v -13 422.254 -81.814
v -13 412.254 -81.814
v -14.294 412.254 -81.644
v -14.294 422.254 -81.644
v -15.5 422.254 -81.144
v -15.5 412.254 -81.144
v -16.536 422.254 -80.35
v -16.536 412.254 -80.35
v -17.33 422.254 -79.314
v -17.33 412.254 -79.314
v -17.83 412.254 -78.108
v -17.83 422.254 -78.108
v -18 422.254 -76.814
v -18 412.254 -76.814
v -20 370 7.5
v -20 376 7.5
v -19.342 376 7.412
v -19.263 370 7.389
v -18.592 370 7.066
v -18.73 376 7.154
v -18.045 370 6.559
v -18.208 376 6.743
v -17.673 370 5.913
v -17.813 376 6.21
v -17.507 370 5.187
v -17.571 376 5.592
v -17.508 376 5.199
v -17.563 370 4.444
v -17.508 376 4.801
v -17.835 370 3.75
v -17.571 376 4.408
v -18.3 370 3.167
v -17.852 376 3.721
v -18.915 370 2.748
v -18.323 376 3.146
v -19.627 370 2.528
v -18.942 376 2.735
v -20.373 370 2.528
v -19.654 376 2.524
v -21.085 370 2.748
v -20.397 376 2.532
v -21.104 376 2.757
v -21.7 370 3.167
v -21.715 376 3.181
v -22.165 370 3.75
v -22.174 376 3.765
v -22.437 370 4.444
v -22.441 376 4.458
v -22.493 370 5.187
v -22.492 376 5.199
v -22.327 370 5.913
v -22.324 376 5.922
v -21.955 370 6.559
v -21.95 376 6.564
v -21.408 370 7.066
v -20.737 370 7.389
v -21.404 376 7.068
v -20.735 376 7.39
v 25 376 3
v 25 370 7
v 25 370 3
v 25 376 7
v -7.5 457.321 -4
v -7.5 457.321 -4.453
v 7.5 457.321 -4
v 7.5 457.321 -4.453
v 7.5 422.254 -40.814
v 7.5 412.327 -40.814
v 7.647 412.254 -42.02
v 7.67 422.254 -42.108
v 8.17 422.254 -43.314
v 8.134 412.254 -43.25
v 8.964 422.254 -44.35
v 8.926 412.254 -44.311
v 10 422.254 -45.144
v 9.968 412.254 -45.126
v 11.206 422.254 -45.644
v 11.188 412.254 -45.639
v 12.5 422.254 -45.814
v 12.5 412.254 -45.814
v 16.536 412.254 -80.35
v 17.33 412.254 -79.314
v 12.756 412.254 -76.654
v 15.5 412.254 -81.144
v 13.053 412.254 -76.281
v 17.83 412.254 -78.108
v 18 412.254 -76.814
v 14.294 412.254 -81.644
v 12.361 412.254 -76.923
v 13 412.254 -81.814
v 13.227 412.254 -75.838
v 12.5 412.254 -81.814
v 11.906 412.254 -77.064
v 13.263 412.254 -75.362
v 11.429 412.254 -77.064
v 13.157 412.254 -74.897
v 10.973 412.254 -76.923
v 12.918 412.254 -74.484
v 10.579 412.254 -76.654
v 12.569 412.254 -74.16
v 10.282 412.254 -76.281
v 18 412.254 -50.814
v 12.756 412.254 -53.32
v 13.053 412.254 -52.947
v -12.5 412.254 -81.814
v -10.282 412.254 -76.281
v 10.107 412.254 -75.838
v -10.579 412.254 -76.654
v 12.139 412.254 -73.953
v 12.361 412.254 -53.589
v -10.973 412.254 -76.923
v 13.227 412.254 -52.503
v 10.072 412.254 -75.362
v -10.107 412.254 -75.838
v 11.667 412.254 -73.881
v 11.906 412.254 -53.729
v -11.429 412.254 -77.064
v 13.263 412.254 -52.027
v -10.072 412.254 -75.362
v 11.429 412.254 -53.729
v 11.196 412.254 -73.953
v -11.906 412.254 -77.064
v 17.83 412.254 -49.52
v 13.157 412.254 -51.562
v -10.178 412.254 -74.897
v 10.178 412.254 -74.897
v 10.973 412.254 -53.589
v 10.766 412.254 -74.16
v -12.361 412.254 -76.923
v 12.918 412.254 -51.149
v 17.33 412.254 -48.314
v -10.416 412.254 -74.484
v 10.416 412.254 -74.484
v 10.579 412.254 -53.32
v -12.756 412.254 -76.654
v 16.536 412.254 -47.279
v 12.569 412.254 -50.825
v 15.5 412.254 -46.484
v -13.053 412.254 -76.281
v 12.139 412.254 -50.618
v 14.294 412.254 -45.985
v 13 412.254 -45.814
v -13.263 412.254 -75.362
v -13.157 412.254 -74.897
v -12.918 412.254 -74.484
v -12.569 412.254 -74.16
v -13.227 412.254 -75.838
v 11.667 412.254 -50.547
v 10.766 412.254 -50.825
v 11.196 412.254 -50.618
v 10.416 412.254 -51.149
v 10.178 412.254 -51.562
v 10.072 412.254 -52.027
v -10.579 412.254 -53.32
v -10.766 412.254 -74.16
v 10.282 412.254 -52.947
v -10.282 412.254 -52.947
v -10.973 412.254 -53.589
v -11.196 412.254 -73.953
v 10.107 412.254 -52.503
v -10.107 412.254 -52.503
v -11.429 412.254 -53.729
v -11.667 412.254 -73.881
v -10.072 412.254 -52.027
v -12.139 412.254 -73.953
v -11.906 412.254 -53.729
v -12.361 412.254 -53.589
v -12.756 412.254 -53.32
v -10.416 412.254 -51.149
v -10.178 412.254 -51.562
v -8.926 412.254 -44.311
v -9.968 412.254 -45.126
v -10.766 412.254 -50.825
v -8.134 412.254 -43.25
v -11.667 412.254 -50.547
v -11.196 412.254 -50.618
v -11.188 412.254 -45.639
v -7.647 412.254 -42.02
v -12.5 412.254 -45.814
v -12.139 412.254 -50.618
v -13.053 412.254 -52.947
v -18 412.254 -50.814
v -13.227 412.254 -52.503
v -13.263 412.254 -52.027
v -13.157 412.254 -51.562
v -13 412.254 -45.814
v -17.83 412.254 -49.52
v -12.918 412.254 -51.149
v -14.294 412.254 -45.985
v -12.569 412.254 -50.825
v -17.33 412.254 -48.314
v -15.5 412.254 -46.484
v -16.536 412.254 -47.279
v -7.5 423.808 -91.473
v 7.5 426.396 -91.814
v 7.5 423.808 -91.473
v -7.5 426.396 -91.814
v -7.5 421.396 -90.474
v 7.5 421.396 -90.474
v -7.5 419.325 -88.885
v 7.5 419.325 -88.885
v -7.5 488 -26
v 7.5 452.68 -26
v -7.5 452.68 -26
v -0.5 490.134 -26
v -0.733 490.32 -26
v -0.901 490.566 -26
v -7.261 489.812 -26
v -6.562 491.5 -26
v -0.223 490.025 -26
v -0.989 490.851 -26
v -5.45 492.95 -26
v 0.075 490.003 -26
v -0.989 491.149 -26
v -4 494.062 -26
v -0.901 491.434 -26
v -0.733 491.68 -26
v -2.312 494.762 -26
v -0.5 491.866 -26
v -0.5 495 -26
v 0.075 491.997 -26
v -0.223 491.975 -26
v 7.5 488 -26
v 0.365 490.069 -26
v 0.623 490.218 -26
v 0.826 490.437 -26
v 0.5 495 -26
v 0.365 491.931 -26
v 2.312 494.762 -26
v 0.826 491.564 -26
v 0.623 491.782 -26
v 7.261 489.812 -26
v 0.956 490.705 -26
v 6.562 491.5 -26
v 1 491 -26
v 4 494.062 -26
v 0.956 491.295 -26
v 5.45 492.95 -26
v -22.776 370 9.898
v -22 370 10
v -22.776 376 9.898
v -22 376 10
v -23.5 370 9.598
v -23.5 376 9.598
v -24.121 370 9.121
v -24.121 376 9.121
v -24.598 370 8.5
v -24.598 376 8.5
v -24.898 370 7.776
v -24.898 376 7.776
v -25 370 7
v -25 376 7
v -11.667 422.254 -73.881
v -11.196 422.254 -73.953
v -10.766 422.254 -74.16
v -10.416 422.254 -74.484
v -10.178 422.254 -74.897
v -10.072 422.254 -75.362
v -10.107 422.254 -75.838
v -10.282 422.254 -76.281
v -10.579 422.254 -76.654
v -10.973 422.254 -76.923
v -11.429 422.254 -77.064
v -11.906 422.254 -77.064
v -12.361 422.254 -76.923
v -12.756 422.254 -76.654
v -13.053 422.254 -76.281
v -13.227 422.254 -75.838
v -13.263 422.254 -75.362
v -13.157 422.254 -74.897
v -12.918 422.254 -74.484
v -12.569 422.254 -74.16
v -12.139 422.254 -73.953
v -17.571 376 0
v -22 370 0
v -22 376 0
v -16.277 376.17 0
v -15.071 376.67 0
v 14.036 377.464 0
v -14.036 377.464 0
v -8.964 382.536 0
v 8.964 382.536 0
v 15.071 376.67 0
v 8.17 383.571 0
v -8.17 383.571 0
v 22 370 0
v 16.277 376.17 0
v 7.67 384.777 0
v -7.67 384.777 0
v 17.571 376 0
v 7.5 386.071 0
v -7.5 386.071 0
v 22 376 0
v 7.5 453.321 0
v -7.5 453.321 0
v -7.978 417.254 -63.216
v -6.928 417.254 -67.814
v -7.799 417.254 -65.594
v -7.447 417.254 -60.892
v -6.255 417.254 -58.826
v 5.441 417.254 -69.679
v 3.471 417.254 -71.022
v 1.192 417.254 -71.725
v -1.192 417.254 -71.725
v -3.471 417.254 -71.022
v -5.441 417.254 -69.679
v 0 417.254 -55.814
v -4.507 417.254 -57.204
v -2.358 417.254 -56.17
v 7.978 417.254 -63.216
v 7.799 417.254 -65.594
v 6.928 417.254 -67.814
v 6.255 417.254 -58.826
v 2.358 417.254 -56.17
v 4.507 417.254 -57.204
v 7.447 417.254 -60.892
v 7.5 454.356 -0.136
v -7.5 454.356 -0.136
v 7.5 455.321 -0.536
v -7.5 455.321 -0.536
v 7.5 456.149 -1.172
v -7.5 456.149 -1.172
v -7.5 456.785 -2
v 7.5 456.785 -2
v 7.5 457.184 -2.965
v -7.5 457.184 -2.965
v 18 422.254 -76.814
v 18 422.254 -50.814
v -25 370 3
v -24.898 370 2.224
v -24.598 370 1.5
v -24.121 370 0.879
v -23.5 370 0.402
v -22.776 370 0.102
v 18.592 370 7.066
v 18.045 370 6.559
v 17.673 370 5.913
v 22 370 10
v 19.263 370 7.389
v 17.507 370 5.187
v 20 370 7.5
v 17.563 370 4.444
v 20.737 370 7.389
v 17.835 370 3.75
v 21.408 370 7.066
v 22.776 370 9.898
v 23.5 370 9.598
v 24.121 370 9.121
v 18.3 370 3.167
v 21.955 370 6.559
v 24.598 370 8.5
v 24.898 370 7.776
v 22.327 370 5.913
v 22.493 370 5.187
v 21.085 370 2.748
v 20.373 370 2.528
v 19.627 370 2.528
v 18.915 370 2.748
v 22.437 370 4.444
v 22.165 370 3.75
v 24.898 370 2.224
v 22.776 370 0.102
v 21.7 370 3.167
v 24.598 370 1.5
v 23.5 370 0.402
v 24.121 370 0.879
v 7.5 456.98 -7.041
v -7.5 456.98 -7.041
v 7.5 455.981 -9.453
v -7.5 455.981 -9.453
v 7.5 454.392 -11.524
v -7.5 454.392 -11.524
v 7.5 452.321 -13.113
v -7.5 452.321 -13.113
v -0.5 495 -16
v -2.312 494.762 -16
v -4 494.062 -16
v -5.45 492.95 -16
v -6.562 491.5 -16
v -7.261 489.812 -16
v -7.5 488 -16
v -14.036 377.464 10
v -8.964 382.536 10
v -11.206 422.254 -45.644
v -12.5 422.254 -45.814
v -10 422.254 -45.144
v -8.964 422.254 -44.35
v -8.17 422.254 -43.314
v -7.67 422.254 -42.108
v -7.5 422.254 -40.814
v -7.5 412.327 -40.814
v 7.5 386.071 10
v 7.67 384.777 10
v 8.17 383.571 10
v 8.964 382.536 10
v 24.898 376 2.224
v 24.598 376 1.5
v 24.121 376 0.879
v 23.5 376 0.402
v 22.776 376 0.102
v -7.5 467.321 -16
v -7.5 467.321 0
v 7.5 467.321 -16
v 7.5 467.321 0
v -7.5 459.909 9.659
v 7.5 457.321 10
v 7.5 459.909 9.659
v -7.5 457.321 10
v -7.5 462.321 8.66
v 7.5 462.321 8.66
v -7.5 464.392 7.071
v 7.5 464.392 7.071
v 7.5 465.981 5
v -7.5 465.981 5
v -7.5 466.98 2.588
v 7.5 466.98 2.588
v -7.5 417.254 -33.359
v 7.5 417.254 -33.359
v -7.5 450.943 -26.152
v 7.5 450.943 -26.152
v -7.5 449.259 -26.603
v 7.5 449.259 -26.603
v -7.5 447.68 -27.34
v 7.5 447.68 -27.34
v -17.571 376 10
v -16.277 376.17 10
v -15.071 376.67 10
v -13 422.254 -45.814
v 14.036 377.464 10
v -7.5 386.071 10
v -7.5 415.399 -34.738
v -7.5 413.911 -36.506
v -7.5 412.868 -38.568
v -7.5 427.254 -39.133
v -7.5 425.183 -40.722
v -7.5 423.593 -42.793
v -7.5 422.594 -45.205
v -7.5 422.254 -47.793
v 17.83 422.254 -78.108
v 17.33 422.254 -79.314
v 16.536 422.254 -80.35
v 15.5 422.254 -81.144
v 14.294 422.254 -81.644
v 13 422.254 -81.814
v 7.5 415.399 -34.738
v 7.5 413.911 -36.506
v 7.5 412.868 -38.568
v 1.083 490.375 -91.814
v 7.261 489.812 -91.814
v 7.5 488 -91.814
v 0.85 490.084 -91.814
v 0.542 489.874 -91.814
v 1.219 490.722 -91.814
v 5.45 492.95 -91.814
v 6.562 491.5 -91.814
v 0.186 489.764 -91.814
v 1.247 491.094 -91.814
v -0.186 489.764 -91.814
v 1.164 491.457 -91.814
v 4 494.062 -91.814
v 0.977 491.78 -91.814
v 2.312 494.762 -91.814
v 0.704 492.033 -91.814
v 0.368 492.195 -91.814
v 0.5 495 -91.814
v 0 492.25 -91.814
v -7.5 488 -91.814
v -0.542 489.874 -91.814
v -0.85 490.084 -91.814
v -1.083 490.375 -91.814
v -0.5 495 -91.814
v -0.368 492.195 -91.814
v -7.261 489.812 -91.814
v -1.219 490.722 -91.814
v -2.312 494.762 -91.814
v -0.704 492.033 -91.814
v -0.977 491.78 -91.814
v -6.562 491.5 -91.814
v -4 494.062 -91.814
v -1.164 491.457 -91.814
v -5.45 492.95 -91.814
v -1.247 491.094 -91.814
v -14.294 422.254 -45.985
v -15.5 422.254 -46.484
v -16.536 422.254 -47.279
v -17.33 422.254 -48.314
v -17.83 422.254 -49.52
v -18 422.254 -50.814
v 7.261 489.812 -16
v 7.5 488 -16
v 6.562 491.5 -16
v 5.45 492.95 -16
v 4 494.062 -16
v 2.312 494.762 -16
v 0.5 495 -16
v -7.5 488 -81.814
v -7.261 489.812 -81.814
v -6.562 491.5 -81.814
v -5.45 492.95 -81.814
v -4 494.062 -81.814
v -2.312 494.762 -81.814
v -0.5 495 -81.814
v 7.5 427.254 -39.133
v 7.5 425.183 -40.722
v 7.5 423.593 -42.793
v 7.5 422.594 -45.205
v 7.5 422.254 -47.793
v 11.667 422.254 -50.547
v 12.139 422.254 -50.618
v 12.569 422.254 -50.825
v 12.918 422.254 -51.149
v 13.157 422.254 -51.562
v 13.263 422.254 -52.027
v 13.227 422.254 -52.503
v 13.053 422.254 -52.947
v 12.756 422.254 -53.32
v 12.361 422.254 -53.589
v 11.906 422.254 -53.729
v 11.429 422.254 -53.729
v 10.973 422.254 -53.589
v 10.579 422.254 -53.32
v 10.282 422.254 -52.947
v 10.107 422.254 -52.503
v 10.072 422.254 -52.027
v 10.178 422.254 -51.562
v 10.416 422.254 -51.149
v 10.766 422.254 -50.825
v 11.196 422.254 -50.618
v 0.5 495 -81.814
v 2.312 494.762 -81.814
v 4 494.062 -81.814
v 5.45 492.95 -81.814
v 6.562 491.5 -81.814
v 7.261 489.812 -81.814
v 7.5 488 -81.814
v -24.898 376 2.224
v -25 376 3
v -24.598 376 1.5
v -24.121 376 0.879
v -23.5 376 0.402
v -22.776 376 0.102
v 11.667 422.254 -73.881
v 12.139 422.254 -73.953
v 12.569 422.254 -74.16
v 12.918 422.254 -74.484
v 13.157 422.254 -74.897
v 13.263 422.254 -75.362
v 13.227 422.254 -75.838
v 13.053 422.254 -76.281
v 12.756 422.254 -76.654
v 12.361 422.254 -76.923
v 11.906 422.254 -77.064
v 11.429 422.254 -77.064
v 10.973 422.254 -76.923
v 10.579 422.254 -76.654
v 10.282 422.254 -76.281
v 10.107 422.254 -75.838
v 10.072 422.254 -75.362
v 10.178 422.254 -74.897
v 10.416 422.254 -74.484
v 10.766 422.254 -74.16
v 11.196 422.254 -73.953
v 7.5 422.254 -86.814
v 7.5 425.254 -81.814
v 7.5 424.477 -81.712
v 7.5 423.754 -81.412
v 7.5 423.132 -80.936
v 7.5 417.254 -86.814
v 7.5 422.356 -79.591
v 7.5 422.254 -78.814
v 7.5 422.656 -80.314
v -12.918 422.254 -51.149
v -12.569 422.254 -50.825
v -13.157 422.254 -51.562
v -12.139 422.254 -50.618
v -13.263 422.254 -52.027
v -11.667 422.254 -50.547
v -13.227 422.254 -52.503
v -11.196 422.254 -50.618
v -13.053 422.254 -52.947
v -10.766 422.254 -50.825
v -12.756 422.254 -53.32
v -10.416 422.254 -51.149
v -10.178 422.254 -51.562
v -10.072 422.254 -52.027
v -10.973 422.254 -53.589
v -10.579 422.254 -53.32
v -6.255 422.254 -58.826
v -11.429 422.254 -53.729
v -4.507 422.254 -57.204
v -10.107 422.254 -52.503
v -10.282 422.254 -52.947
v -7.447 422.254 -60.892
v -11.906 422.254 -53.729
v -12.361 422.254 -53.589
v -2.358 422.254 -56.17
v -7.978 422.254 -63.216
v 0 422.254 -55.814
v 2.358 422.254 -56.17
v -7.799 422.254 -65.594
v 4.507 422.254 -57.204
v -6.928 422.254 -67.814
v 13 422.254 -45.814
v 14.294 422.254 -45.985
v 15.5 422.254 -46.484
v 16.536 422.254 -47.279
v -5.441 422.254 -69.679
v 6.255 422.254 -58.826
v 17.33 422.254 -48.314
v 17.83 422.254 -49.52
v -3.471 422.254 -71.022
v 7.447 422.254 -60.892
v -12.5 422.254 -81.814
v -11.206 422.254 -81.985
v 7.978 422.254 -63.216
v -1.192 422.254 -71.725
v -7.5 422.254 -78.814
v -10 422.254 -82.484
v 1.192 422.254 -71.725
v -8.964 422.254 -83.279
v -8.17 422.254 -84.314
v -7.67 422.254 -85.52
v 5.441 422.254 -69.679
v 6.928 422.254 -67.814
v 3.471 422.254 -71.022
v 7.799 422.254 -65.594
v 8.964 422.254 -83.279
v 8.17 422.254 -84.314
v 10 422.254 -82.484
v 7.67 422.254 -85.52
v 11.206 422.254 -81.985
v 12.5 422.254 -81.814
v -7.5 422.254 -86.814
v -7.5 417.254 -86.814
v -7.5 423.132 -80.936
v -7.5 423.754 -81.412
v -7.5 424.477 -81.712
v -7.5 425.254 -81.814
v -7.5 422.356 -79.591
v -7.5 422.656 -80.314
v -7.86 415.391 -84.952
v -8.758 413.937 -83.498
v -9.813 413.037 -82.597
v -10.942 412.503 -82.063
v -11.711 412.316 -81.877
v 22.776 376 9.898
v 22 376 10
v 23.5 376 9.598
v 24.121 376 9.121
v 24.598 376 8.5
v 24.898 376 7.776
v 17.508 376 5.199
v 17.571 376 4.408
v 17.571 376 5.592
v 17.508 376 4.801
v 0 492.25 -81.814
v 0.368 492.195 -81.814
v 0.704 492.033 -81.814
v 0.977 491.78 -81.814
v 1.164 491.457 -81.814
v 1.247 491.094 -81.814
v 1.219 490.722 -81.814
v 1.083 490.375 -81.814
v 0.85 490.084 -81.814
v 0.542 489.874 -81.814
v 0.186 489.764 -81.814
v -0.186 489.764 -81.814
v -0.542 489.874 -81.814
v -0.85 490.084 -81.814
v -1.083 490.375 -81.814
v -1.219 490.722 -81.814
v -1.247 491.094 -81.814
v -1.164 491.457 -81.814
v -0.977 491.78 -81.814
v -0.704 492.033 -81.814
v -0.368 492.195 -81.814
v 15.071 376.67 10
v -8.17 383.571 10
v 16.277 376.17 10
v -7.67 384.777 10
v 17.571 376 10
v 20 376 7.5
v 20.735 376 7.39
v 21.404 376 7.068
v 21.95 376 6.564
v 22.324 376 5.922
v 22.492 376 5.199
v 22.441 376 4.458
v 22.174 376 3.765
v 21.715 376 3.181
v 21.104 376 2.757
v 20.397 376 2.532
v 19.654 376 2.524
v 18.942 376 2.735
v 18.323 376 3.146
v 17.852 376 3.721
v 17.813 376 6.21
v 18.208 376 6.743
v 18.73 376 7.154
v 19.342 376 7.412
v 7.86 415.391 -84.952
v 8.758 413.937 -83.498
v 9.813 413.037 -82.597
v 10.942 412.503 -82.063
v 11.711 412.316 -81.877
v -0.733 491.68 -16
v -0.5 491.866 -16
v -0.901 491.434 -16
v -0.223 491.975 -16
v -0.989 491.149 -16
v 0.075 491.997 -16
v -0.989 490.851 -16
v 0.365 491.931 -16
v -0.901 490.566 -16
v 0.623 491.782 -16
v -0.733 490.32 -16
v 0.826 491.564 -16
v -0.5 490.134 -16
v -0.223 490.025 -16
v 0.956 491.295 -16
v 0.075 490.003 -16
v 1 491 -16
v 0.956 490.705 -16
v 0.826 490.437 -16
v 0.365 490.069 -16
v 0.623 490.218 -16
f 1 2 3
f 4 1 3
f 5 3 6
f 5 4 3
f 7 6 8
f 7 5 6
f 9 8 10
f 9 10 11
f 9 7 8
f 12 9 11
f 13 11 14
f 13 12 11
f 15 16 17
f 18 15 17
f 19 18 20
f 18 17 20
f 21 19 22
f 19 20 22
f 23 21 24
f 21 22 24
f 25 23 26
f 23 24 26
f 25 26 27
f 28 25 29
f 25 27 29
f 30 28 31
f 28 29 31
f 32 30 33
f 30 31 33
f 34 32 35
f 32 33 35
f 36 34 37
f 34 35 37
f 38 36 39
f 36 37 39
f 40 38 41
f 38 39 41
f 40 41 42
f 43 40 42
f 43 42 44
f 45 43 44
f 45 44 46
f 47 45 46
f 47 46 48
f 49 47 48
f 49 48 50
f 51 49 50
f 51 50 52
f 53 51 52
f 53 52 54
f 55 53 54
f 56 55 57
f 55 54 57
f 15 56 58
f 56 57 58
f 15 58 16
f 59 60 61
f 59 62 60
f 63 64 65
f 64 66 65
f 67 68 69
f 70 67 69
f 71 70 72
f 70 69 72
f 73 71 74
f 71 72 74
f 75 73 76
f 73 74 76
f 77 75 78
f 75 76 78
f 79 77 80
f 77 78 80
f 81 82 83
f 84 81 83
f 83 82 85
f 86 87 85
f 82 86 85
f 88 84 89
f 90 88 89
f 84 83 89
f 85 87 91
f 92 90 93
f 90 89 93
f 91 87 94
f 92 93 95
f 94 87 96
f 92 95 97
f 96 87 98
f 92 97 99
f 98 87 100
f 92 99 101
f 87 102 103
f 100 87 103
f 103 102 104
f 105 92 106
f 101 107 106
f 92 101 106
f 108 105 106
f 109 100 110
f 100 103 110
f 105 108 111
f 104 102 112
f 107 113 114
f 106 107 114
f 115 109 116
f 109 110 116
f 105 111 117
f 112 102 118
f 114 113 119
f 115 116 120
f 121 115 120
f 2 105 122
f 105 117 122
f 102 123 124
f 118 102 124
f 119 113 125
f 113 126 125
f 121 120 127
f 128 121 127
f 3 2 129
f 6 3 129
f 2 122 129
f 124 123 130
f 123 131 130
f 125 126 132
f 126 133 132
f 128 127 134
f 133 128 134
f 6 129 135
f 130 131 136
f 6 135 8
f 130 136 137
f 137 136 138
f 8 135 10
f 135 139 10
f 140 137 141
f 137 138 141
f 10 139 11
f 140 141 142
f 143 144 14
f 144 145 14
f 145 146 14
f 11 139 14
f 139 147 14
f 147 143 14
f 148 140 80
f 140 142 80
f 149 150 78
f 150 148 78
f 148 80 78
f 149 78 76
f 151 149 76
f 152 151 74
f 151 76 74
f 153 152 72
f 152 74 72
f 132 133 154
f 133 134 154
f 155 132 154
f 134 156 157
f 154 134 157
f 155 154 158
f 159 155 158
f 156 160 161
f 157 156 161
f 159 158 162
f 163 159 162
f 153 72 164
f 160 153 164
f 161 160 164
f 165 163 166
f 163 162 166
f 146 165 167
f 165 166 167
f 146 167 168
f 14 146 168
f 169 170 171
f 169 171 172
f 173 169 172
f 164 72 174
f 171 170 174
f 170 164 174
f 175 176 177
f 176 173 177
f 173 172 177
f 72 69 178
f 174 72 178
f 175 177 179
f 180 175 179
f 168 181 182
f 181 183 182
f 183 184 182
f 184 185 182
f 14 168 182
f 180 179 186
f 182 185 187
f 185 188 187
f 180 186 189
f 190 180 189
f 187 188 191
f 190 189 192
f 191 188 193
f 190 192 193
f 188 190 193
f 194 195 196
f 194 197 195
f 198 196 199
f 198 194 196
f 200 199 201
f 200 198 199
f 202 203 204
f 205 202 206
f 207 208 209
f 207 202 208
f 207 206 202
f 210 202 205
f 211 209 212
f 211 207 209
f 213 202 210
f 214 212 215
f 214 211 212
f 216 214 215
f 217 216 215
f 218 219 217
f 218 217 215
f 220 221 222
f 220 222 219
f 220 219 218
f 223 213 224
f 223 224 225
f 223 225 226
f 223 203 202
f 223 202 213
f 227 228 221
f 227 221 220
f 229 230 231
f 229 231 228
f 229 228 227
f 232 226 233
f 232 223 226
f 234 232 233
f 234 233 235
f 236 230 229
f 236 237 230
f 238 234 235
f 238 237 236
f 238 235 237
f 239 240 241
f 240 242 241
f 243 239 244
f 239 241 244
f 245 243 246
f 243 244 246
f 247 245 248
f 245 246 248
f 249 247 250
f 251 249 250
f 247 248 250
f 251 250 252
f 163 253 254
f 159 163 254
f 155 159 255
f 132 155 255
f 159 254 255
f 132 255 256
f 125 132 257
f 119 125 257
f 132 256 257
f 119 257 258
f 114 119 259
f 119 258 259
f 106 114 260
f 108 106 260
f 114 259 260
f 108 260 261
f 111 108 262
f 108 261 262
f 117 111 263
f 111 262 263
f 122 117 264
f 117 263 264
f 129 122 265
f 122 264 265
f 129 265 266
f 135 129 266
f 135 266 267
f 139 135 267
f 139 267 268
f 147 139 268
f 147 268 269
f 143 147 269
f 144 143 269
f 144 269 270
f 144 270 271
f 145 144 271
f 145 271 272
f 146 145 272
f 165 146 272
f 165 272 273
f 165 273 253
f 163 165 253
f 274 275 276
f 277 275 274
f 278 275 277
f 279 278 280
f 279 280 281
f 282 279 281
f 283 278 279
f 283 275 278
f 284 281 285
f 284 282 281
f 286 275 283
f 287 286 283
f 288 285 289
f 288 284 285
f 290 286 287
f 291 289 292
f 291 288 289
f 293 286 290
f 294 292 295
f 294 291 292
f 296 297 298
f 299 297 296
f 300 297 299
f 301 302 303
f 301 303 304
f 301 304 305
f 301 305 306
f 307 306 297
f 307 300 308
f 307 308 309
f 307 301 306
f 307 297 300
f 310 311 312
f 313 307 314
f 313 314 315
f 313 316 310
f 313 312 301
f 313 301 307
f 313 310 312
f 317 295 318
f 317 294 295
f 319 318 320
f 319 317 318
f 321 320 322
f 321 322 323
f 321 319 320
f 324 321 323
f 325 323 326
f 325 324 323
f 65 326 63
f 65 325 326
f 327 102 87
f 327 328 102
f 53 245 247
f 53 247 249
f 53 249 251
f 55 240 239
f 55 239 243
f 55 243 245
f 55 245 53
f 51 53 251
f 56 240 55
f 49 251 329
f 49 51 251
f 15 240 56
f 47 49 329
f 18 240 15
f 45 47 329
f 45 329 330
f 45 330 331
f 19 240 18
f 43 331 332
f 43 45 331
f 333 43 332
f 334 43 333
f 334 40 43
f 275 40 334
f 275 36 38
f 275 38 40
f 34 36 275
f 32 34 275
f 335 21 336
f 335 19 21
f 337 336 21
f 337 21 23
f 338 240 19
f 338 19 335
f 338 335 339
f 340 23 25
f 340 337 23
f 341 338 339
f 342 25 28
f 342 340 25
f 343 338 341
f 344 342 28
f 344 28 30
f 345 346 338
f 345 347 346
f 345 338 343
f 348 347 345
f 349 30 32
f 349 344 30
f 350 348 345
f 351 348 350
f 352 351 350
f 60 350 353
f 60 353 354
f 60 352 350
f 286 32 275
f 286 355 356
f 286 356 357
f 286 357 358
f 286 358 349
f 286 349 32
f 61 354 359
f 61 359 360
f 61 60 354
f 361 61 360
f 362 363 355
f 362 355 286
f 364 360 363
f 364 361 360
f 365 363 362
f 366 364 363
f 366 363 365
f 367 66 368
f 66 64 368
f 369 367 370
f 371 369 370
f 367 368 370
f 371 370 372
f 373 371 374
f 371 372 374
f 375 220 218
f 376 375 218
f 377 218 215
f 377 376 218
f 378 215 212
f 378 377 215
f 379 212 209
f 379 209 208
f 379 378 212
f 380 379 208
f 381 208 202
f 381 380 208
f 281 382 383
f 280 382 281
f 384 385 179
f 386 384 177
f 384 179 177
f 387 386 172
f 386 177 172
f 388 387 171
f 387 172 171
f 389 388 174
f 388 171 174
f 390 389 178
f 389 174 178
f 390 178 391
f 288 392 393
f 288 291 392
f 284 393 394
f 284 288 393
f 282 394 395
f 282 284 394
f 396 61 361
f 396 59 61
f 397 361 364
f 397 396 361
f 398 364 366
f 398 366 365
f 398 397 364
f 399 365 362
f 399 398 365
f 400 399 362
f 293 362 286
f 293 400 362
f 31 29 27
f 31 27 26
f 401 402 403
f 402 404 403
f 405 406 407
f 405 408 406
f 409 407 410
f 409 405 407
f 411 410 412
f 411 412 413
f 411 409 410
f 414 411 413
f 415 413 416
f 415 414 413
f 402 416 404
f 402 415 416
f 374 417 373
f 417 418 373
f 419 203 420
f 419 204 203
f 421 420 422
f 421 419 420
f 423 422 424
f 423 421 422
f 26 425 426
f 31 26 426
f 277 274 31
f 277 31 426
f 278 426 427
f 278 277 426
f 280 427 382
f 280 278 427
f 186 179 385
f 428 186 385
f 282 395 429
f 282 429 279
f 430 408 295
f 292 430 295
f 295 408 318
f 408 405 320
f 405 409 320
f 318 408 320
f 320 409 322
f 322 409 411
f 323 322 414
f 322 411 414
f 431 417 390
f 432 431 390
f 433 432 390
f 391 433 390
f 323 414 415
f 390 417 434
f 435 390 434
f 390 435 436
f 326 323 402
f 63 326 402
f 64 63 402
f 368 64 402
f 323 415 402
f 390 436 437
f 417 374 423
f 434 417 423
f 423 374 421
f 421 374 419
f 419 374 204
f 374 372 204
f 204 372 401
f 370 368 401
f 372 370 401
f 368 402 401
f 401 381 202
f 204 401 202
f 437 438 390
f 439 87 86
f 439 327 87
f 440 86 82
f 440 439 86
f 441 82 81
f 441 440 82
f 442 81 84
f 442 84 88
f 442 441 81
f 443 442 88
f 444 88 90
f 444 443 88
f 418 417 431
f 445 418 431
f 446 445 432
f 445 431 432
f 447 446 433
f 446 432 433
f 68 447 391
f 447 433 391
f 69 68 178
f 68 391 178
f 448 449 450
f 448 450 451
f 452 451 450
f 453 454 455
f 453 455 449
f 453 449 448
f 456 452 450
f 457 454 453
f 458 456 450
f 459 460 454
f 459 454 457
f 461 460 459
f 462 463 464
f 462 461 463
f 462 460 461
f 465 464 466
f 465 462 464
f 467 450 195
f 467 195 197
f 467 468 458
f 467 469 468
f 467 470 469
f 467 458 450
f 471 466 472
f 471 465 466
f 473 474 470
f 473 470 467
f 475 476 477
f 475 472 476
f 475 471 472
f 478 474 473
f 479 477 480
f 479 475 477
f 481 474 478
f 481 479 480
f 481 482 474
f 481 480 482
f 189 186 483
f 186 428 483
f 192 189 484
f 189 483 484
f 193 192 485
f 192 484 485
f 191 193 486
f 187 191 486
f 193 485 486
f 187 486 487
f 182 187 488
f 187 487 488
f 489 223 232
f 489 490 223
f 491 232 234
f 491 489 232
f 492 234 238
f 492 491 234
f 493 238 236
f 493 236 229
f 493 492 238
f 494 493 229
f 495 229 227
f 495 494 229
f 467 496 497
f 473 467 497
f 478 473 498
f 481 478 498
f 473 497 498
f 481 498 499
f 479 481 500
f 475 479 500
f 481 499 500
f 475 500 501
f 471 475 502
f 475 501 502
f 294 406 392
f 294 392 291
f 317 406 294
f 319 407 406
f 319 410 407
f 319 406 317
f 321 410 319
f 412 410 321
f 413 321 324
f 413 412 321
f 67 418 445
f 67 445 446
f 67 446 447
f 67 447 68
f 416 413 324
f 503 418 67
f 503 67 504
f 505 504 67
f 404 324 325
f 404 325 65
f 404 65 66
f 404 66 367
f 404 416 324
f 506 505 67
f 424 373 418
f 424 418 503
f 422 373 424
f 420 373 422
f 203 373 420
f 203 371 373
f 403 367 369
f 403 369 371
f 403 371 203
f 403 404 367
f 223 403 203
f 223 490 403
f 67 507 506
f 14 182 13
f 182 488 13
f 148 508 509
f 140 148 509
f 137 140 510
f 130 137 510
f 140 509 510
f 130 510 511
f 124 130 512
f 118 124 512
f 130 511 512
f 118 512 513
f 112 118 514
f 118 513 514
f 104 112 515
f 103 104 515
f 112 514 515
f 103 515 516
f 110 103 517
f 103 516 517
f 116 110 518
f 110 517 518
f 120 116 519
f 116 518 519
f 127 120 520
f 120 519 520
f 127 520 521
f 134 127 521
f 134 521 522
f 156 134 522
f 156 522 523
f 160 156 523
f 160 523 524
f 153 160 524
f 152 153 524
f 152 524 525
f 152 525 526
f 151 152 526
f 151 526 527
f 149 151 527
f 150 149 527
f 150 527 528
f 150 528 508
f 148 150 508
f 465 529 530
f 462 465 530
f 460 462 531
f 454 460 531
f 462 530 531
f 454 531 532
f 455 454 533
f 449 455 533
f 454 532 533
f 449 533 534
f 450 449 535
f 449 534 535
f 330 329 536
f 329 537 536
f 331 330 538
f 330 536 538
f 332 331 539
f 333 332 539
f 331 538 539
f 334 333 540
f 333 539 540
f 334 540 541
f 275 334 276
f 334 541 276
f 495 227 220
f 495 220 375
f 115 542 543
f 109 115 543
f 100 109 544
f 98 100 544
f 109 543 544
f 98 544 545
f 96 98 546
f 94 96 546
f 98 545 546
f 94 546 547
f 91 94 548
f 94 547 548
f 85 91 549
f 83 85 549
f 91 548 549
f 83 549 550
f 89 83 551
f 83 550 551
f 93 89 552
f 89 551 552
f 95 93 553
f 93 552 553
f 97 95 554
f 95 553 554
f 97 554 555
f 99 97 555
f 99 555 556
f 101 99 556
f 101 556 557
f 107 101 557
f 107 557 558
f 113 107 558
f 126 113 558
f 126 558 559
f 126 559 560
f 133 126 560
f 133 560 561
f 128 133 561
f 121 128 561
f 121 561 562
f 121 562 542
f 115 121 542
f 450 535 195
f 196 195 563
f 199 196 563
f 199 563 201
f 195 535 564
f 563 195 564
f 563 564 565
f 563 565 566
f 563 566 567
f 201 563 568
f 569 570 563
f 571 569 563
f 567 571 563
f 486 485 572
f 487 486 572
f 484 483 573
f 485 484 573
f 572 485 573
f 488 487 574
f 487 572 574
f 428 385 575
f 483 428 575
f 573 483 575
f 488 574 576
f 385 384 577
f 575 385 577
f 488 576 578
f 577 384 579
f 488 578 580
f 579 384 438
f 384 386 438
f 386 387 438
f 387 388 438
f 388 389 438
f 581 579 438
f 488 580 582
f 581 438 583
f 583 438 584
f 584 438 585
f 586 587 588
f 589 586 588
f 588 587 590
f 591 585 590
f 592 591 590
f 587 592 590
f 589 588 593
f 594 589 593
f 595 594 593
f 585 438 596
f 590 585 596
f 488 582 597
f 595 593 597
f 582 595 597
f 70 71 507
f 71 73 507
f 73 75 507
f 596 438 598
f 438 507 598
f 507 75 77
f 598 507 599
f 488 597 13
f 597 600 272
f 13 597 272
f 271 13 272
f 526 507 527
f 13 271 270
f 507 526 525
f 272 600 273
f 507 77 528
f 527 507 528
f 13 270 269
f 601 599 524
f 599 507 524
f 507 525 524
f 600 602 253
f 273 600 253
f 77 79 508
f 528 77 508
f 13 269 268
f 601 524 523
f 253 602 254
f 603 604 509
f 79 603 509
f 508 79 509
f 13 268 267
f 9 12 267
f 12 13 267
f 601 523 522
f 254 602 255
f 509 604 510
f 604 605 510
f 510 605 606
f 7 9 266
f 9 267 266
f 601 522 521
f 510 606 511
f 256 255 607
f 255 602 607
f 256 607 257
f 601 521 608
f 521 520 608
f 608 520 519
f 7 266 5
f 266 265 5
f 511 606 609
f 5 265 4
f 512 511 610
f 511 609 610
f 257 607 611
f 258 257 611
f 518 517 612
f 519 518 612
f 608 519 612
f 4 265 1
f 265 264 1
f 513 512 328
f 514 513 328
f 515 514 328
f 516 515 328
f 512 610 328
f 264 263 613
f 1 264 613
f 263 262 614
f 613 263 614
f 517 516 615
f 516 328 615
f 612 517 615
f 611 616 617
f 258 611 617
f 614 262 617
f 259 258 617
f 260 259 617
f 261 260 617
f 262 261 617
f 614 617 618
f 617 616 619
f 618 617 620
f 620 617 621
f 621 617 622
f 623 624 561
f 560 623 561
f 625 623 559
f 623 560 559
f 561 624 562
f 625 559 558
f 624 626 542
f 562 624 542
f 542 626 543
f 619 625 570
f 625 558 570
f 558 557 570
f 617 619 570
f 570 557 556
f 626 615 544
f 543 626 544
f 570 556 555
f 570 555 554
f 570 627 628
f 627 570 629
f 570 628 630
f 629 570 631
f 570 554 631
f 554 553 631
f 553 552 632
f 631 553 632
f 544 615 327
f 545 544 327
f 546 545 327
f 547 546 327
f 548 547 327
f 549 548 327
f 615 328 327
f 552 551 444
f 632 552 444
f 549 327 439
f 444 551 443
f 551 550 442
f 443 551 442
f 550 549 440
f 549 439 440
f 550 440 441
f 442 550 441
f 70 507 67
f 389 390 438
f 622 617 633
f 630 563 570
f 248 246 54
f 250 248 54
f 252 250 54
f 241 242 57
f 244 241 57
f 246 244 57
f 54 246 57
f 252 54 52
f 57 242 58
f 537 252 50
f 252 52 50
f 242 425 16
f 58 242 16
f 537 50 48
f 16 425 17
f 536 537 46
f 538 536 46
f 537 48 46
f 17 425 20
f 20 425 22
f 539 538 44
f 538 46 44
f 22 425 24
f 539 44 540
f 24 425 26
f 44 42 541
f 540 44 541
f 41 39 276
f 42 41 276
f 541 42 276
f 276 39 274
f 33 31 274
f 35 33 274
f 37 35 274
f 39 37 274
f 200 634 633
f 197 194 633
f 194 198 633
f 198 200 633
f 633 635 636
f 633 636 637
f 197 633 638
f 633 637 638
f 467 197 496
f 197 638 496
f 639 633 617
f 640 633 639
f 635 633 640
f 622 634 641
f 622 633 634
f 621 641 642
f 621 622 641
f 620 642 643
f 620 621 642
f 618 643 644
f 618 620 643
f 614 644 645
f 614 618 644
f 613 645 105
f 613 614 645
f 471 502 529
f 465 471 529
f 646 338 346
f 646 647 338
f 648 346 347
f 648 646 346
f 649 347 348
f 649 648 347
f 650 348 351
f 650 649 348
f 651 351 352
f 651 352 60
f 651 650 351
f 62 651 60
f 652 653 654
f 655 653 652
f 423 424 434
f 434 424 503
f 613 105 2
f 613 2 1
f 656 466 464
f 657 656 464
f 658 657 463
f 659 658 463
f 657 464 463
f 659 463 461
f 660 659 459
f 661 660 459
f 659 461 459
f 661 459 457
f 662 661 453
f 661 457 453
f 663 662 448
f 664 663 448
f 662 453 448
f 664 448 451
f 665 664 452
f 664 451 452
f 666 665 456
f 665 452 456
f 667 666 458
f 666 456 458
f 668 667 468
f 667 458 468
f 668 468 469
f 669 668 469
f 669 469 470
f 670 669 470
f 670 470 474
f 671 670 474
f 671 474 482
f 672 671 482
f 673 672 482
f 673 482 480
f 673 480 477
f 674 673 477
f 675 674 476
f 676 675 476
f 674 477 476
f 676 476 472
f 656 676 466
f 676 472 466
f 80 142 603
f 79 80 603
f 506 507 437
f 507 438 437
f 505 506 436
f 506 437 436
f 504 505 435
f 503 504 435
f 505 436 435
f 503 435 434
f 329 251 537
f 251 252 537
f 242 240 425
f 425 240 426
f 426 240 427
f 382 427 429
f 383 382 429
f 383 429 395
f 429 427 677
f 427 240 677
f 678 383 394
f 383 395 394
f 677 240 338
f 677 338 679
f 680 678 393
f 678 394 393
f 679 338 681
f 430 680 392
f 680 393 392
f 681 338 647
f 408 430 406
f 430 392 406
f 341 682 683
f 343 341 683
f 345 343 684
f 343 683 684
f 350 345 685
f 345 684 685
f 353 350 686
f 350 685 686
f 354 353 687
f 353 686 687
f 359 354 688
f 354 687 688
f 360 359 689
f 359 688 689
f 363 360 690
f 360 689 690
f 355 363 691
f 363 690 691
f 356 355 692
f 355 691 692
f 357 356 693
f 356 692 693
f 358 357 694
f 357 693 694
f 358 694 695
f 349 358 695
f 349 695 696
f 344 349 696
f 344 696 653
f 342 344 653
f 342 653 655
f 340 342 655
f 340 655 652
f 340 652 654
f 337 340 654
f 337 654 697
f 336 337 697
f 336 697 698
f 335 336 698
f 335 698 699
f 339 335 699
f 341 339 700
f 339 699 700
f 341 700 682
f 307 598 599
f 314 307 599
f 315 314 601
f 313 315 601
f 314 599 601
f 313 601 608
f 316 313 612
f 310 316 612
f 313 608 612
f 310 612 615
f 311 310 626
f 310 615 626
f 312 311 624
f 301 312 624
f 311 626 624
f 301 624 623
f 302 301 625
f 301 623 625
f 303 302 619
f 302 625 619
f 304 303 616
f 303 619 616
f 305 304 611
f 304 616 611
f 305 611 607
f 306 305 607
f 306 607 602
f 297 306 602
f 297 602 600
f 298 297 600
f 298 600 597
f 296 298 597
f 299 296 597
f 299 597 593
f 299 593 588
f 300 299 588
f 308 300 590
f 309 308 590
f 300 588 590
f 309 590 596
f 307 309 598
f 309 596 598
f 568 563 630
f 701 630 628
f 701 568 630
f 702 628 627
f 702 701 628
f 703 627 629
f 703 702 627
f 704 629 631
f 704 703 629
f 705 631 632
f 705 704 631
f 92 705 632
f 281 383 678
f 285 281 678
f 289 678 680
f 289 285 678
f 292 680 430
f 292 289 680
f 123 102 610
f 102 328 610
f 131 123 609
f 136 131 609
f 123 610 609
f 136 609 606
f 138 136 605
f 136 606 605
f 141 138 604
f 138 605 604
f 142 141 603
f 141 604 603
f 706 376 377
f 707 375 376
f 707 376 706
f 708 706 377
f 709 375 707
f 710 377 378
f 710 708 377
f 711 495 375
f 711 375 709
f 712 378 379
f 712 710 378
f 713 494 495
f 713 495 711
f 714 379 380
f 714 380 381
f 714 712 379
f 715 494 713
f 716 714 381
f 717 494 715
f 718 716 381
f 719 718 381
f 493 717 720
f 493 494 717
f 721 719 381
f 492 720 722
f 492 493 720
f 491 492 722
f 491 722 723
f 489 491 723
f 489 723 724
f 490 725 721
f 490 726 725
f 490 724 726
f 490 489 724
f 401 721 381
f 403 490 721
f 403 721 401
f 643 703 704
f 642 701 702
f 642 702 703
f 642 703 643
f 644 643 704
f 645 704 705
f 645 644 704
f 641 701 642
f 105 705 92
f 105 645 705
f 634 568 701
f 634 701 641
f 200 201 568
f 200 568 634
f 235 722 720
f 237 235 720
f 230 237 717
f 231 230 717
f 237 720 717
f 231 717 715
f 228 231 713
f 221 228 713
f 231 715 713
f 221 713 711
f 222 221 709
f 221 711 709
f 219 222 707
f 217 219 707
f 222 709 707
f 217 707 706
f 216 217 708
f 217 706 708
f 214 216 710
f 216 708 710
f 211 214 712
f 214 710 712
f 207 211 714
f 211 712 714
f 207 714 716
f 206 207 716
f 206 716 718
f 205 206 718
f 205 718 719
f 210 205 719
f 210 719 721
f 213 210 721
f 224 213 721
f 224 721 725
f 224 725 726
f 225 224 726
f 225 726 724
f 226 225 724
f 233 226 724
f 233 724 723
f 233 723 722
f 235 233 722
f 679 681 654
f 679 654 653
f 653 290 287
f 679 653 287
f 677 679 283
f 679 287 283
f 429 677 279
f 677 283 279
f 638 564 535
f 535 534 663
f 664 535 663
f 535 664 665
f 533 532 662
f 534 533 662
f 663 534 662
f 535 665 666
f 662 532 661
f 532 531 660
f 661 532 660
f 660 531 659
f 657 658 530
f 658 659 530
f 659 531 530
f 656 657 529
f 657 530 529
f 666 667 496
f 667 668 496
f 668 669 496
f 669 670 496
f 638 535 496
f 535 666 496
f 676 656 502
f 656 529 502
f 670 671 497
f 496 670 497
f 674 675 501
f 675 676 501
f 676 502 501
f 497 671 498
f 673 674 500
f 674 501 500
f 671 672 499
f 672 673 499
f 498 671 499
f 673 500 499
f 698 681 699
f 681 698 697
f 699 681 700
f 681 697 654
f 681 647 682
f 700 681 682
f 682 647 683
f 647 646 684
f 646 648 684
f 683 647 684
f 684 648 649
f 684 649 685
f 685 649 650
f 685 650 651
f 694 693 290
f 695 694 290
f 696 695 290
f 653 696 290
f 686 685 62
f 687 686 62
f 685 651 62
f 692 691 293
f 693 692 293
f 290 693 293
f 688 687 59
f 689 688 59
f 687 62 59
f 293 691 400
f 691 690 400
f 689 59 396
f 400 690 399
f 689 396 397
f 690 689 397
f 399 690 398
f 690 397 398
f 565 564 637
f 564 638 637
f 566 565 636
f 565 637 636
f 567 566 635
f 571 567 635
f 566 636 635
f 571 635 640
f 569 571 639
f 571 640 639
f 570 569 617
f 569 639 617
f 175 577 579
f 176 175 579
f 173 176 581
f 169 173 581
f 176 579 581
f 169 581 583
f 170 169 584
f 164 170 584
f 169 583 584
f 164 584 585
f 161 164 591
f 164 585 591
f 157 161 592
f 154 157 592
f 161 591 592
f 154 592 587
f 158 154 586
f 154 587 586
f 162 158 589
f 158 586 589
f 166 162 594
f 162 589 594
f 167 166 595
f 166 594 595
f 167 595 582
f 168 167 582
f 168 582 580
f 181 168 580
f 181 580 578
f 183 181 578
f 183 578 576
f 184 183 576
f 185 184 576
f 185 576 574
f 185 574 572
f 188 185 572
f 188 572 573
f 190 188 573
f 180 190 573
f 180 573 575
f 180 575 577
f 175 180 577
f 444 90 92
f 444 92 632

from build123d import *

# Parameters (mm, degrees)
SKETCH1_W           = 40
SKETCH1_H           = 50
BOSS_EXTRUDE1_DEPTH = 5
BOSS_EXTRUDE2_DEPTH = 7.5
FILLET3_R           = 10
SKETCH6_W           = 36
SKETCH6_H           = 10
BOSS_EXTRUDE3_DEPTH = 18
SKETCH7_R           = 8
CUT_EXTRUDE3_DEPTH  = 5
FILLET5_R           = 5
SKETCH8_R           = 1.6
CUT_EXTRUDE4_DEPTH  = 100.116132934
FILLET6_R           = 3
BOSS_EXTRUDE4_DEPTH = 15
SKETCH10_R          = 1
CUT_EXTRUDE5_DEPTH  = 500.756658462
FILLET8_R           = 10
FILLET9_R           = 7
CUT_EXTRUDE7_DEPTH  = 5
FILLET10_R          = 4
SKETCH13_W          = 10
SKETCH13_H          = 6
BOSS_EXTRUDE5_DEPTH = 25
CHAMFER1_SIZE       = 8
FILLET11_R          = 5
FILLET12_R          = 3
BOSS_EXTRUDE7_DEPTH = 10
CHAMFER2_SIZE       = 10
FILLET15_R          = 10
FILLET16_R          = 3
FILLET17_R          = 5
SKETCH19_R          = 1.25
CUT_EXTRUDE8_DEPTH  = 10
SKETCH20_R          = 2.5
CUT_EXTRUDE9_DEPTH  = 153.367653519


with BuildPart() as part:
    # Sketch1 → Boss-Extrude1 (new body)
    with BuildSketch(Plane.XY):
        with Locations((0, 421.657979857)):
            Rectangle(SKETCH1_W, SKETCH1_H)
    extrude(amount=BOSS_EXTRUDE1_DEPTH)

    # Sketch5 → Boss-Extrude2 (add, symmetric)
    with BuildSketch(Plane(origin=(0, 0, 0), x_dir=(0, 0, -1), z_dir=(1, 0, 0))):
        Polygon((-10, 370), (-10, 467.320715151), (16, 467.320715151), (42.019504932, 422.253610621), (76.24600224, 422.253610621), (76.24600224, 412.253610621), (36.24600224, 412.253610621), (10.226497308, 457.320715151), (0, 457.320715151), (0, 370), align=None)
    extrude(amount=BOSS_EXTRUDE2_DEPTH, both=True)

    # Fillet3
    fillet3_edges = [part.edges().sort_by_distance(p)[0] for p in [
        (0, 457.320715151, -10.226497308),
        (0, 412.253610621, -36.24600224),
        (0, 422.253610621, -42.019504932),
        (0, 467.320715151, 10),
    ]]
    fillet(fillet3_edges, radius=FILLET3_R)

    # Sketch6 → Boss-Extrude3 (add, symmetric)
    with BuildSketch(Plane(origin=(0, 0, 0), x_dir=(0, 0, -1), z_dir=(1, 0, 0))):
        with Locations((63.814228499, 417.253610621)):
            Rectangle(SKETCH6_W, SKETCH6_H)
    extrude(amount=BOSS_EXTRUDE3_DEPTH, both=True)

    # Sketch7 → Cut-Extrude3 (cut)
    with BuildSketch(Plane(origin=(0, 422.253610621, 0), x_dir=(1, 0, 0), z_dir=(0, 1, 0))):
        with Locations(Location((0, 63.814228499, 0), (0, 0, 270))):
            Circle(SKETCH7_R)
    extrude(amount=-CUT_EXTRUDE3_DEPTH, mode=Mode.SUBTRACT)

    # Fillet5
    fillet5_edges = [part.edges().sort_by_distance(p)[0] for p in [
        (-7.5, 417.253610621, -45.814228499),
    ]]
    fillet(fillet5_edges, radius=FILLET5_R)
    fillet5_2_edges = [part.edges().sort_by_distance(p)[0] for p in [
        (-18, 417.253610621, -45.814228499),
    ]]
    fillet(fillet5_2_edges, radius=FILLET5_R)
    fillet5_3_edges = [part.edges().sort_by_distance(p)[0] for p in [
        (7.5, 417.253610621, -45.814228499),
    ]]
    fillet(fillet5_3_edges, radius=FILLET5_R)
    fillet5_4_edges = [part.edges().sort_by_distance(p)[0] for p in [
        (18, 417.253610621, -45.814228499),
    ]]
    fillet(fillet5_4_edges, radius=FILLET5_R)
    fillet5_5_edges = [part.edges().sort_by_distance(p)[0] for p in [
        (18, 417.253610621, -81.814228499),
    ]]
    fillet(fillet5_5_edges, radius=FILLET5_R)
    fillet5_6_edges = [part.edges().sort_by_distance(p)[0] for p in [
        (-18, 417.253610621, -81.814228499),
    ]]
    fillet(fillet5_6_edges, radius=FILLET5_R)

    # Sketch8 → Cut-Extrude4 (cut, through all)
    with BuildSketch(Plane(origin=(0, 422.253610621, 0), x_dir=(1, 0, 0), z_dir=(0, 1, 0))):
        with Locations(Location((11.66726189, 52.14696661, 0), (0, 0, 270))):
            Circle(SKETCH8_R)
        with Locations(Location((-11.66726189, 52.14696661, 0), (0, 0, 270))):
            Circle(SKETCH8_R)
        with Locations(Location((-11.66726189, 75.481490389, 0), (0, 0, 270))):
            Circle(SKETCH8_R)
        with Locations(Location((11.66726189, 75.481490389, 0), (0, 0, 270))):
            Circle(SKETCH8_R)
    extrude(amount=-CUT_EXTRUDE4_DEPTH, mode=Mode.SUBTRACT)

    # Fillet6
    fillet6_edges = [part.edges().sort_by_distance(p)[0] for p in [
        (-20, 446.657979857, 2.5),
        (20, 446.657979857, 2.5),
        (20, 396.657979857, 2.5),
        (-20, 396.657979857, 2.5),
    ]]
    fillet(fillet6_edges, radius=FILLET6_R)

    # Sketch9 → Boss-Extrude4 (add)
    with BuildSketch(Plane(origin=(7.5, 0, 0), x_dir=(0, 0, -1), z_dir=(1, 0, 0))):
        Polygon((26, 450.000207075), (26, 495.000207075), (16, 495.000207075), (16, 467.320715151), align=None)
    extrude(amount=-BOSS_EXTRUDE4_DEPTH)

    # Sketch10 → Cut-Extrude5 (cut, through all)
    with BuildSketch(Plane.XY.offset(-16)):
        with Locations((0, 491.000207075)):
            Circle(SKETCH10_R)
    extrude(amount=-CUT_EXTRUDE5_DEPTH, mode=Mode.SUBTRACT)

    # Fillet8
    fillet8_edges = [part.edges().sort_by_distance(p)[0] for p in [
        (0, 450.000207075, -26),
    ]]
    fillet(fillet8_edges, radius=FILLET8_R)

    # Fillet9
    fillet9_edges = [part.edges().sort_by_distance(p)[0] for p in [
        (7.5, 495.000207075, -21),
        (-7.5, 495.000207075, -21),
    ]]
    fillet(fillet9_edges, radius=FILLET9_R)

    # Sketch12 → Cut-Extrude7 (cut)
    with BuildSketch(Plane.XY.offset(5)):
        with BuildLine():
            Line((7.5, 396.657979857), (17, 396.657979857))
            ThreePointArc((17, 396.657979857), (19.121320344, 397.536659513), (20, 399.657979857))
            Line((20, 399.657979857), (20, 443.657979857))
            ThreePointArc((20, 443.657979857), (19.121320344, 445.7793002), (17, 446.657979857))
            Line((17, 446.657979857), (7.5, 446.657979857))
            Line((7.5, 446.657979857), (7.5, 396.657979857))
        make_face()
        with BuildLine():
            Line((-20, 443.657979857), (-20, 399.657979857))
            ThreePointArc((-20, 399.657979857), (-19.121320344, 397.536659513), (-17, 396.657979857))
            Line((-17, 396.657979857), (-7.5, 396.657979857))
            Line((-7.5, 396.657979857), (-7.5, 446.657979857))
            Line((-7.5, 446.657979857), (-17, 446.657979857))
            ThreePointArc((-17, 446.657979857), (-19.121320344, 445.7793002), (-20, 443.657979857))
        make_face()
    extrude(amount=-CUT_EXTRUDE7_DEPTH, mode=Mode.SUBTRACT)

    # Fillet10
    fillet10_edges = [part.edges().sort_by_distance(p)[0] for p in [
        (0, 457.320715151, 0),
    ]]
    fillet(fillet10_edges, radius=FILLET10_R)

    # Sketch13 → Boss-Extrude5 (add, symmetric)
    with BuildSketch(Plane(origin=(0, 0, 0), x_dir=(0, 0, -1), z_dir=(1, 0, 0))):
        with Locations((-5, 373)):
            Rectangle(SKETCH13_W, SKETCH13_H)
    extrude(amount=BOSS_EXTRUDE5_DEPTH, both=True)

    # Chamfer1
    chamfer1_edges = [part.edges().sort_by_distance(p)[0] for p in [
        (7.5, 376, 5),
        (-7.5, 376, 5),
    ]]
    chamfer(chamfer1_edges, length=CHAMFER1_SIZE)

    # Fillet11
    fillet11_edges = [part.edges().sort_by_distance(p)[0] for p in [
        (-15.5, 376, 5),
        (-7.5, 384, 5),
        (7.5, 384, 5),
        (15.5, 376, 5),
    ]]
    fillet(fillet11_edges, radius=FILLET11_R)

    # Fillet12
    fillet12_edges = [part.edges().sort_by_distance(p)[0] for p in [
        (-25, 373, 10),
        (-25, 373, 0),
        (25, 373, 10),
        (25, 373, 0),
    ]]
    fillet(fillet12_edges, radius=FILLET12_R)

    # Sketch18 → Boss-Extrude7 (add)
    with BuildSketch(Plane(origin=(0, 0, -81.814228499), x_dir=(-1, 0, 0), z_dir=(0, 0, -1))):
        with BuildLine():
            Line((7.5, 412.253610621), (7.5, 488.000207075))
            ThreePointArc((7.5, 488.000207075), (5.449747468, 492.949954543), (0.5, 495.000207075))
            Line((0.5, 495.000207075), (-0.5, 495.000207075))
            ThreePointArc((-0.5, 495.000207075), (-5.449747468, 492.949954543), (-7.5, 488.000207075))
            Line((-7.5, 488.000207075), (-7.5, 412.253610621))
            Line((-7.5, 412.253610621), (7.5, 412.253610621))
        make_face()
    extrude(amount=BOSS_EXTRUDE7_DEPTH)

    # Chamfer2
    chamfer2_edges = [part.edges().sort_by_distance(p)[0] for p in [
        (0, 412.253610621, -91.814228499),
    ]]
    chamfer(chamfer2_edges, length=CHAMFER2_SIZE)

    # Fillet15
    fillet15_edges = [part.edges().sort_by_distance(p)[0] for p in [
        (0, 422.253610621, -91.814228499),
    ]]
    fillet(fillet15_edges, radius=FILLET15_R)

    # Fillet16
    fillet16_edges = [part.edges().sort_by_distance(p)[0] for p in [
        (0, 422.253610621, -81.814228499),
    ]]
    fillet(fillet16_edges, radius=FILLET16_R)

    # Fillet17
    fillet17_edges = [part.edges().sort_by_distance(p)[0] for p in [
        (7.5, 417.253610621, -81.814228499),
        (-7.5, 417.253610621, -81.814228499),
    ]]
    fillet(fillet17_edges, radius=FILLET17_R)

    # Sketch19 → Cut-Extrude8 (cut)
    with BuildSketch(Plane(origin=(0, 0, -91.814228499), x_dir=(-1, 0, 0), z_dir=(0, 0, -1))):
        with Locations(Location((0, 491.000207075, 0), (0, 0, 90))):
            Circle(SKETCH19_R)
    extrude(amount=-CUT_EXTRUDE8_DEPTH, mode=Mode.SUBTRACT)

    # Sketch20 → Cut-Extrude9 (cut, through all)
    with BuildSketch(Plane(origin=(0, 376, 0), x_dir=(1, 0, 0), z_dir=(0, 1, 0))):
        with Locations(Location((-20, -5, 0), (0, 0, 270))):
            Circle(SKETCH20_R)
        with Locations(Location((20, -5, 0), (0, 0, 270))):
            Circle(SKETCH20_R)
    extrude(amount=-CUT_EXTRUDE9_DEPTH, mode=Mode.SUBTRACT)


solid = part.part
